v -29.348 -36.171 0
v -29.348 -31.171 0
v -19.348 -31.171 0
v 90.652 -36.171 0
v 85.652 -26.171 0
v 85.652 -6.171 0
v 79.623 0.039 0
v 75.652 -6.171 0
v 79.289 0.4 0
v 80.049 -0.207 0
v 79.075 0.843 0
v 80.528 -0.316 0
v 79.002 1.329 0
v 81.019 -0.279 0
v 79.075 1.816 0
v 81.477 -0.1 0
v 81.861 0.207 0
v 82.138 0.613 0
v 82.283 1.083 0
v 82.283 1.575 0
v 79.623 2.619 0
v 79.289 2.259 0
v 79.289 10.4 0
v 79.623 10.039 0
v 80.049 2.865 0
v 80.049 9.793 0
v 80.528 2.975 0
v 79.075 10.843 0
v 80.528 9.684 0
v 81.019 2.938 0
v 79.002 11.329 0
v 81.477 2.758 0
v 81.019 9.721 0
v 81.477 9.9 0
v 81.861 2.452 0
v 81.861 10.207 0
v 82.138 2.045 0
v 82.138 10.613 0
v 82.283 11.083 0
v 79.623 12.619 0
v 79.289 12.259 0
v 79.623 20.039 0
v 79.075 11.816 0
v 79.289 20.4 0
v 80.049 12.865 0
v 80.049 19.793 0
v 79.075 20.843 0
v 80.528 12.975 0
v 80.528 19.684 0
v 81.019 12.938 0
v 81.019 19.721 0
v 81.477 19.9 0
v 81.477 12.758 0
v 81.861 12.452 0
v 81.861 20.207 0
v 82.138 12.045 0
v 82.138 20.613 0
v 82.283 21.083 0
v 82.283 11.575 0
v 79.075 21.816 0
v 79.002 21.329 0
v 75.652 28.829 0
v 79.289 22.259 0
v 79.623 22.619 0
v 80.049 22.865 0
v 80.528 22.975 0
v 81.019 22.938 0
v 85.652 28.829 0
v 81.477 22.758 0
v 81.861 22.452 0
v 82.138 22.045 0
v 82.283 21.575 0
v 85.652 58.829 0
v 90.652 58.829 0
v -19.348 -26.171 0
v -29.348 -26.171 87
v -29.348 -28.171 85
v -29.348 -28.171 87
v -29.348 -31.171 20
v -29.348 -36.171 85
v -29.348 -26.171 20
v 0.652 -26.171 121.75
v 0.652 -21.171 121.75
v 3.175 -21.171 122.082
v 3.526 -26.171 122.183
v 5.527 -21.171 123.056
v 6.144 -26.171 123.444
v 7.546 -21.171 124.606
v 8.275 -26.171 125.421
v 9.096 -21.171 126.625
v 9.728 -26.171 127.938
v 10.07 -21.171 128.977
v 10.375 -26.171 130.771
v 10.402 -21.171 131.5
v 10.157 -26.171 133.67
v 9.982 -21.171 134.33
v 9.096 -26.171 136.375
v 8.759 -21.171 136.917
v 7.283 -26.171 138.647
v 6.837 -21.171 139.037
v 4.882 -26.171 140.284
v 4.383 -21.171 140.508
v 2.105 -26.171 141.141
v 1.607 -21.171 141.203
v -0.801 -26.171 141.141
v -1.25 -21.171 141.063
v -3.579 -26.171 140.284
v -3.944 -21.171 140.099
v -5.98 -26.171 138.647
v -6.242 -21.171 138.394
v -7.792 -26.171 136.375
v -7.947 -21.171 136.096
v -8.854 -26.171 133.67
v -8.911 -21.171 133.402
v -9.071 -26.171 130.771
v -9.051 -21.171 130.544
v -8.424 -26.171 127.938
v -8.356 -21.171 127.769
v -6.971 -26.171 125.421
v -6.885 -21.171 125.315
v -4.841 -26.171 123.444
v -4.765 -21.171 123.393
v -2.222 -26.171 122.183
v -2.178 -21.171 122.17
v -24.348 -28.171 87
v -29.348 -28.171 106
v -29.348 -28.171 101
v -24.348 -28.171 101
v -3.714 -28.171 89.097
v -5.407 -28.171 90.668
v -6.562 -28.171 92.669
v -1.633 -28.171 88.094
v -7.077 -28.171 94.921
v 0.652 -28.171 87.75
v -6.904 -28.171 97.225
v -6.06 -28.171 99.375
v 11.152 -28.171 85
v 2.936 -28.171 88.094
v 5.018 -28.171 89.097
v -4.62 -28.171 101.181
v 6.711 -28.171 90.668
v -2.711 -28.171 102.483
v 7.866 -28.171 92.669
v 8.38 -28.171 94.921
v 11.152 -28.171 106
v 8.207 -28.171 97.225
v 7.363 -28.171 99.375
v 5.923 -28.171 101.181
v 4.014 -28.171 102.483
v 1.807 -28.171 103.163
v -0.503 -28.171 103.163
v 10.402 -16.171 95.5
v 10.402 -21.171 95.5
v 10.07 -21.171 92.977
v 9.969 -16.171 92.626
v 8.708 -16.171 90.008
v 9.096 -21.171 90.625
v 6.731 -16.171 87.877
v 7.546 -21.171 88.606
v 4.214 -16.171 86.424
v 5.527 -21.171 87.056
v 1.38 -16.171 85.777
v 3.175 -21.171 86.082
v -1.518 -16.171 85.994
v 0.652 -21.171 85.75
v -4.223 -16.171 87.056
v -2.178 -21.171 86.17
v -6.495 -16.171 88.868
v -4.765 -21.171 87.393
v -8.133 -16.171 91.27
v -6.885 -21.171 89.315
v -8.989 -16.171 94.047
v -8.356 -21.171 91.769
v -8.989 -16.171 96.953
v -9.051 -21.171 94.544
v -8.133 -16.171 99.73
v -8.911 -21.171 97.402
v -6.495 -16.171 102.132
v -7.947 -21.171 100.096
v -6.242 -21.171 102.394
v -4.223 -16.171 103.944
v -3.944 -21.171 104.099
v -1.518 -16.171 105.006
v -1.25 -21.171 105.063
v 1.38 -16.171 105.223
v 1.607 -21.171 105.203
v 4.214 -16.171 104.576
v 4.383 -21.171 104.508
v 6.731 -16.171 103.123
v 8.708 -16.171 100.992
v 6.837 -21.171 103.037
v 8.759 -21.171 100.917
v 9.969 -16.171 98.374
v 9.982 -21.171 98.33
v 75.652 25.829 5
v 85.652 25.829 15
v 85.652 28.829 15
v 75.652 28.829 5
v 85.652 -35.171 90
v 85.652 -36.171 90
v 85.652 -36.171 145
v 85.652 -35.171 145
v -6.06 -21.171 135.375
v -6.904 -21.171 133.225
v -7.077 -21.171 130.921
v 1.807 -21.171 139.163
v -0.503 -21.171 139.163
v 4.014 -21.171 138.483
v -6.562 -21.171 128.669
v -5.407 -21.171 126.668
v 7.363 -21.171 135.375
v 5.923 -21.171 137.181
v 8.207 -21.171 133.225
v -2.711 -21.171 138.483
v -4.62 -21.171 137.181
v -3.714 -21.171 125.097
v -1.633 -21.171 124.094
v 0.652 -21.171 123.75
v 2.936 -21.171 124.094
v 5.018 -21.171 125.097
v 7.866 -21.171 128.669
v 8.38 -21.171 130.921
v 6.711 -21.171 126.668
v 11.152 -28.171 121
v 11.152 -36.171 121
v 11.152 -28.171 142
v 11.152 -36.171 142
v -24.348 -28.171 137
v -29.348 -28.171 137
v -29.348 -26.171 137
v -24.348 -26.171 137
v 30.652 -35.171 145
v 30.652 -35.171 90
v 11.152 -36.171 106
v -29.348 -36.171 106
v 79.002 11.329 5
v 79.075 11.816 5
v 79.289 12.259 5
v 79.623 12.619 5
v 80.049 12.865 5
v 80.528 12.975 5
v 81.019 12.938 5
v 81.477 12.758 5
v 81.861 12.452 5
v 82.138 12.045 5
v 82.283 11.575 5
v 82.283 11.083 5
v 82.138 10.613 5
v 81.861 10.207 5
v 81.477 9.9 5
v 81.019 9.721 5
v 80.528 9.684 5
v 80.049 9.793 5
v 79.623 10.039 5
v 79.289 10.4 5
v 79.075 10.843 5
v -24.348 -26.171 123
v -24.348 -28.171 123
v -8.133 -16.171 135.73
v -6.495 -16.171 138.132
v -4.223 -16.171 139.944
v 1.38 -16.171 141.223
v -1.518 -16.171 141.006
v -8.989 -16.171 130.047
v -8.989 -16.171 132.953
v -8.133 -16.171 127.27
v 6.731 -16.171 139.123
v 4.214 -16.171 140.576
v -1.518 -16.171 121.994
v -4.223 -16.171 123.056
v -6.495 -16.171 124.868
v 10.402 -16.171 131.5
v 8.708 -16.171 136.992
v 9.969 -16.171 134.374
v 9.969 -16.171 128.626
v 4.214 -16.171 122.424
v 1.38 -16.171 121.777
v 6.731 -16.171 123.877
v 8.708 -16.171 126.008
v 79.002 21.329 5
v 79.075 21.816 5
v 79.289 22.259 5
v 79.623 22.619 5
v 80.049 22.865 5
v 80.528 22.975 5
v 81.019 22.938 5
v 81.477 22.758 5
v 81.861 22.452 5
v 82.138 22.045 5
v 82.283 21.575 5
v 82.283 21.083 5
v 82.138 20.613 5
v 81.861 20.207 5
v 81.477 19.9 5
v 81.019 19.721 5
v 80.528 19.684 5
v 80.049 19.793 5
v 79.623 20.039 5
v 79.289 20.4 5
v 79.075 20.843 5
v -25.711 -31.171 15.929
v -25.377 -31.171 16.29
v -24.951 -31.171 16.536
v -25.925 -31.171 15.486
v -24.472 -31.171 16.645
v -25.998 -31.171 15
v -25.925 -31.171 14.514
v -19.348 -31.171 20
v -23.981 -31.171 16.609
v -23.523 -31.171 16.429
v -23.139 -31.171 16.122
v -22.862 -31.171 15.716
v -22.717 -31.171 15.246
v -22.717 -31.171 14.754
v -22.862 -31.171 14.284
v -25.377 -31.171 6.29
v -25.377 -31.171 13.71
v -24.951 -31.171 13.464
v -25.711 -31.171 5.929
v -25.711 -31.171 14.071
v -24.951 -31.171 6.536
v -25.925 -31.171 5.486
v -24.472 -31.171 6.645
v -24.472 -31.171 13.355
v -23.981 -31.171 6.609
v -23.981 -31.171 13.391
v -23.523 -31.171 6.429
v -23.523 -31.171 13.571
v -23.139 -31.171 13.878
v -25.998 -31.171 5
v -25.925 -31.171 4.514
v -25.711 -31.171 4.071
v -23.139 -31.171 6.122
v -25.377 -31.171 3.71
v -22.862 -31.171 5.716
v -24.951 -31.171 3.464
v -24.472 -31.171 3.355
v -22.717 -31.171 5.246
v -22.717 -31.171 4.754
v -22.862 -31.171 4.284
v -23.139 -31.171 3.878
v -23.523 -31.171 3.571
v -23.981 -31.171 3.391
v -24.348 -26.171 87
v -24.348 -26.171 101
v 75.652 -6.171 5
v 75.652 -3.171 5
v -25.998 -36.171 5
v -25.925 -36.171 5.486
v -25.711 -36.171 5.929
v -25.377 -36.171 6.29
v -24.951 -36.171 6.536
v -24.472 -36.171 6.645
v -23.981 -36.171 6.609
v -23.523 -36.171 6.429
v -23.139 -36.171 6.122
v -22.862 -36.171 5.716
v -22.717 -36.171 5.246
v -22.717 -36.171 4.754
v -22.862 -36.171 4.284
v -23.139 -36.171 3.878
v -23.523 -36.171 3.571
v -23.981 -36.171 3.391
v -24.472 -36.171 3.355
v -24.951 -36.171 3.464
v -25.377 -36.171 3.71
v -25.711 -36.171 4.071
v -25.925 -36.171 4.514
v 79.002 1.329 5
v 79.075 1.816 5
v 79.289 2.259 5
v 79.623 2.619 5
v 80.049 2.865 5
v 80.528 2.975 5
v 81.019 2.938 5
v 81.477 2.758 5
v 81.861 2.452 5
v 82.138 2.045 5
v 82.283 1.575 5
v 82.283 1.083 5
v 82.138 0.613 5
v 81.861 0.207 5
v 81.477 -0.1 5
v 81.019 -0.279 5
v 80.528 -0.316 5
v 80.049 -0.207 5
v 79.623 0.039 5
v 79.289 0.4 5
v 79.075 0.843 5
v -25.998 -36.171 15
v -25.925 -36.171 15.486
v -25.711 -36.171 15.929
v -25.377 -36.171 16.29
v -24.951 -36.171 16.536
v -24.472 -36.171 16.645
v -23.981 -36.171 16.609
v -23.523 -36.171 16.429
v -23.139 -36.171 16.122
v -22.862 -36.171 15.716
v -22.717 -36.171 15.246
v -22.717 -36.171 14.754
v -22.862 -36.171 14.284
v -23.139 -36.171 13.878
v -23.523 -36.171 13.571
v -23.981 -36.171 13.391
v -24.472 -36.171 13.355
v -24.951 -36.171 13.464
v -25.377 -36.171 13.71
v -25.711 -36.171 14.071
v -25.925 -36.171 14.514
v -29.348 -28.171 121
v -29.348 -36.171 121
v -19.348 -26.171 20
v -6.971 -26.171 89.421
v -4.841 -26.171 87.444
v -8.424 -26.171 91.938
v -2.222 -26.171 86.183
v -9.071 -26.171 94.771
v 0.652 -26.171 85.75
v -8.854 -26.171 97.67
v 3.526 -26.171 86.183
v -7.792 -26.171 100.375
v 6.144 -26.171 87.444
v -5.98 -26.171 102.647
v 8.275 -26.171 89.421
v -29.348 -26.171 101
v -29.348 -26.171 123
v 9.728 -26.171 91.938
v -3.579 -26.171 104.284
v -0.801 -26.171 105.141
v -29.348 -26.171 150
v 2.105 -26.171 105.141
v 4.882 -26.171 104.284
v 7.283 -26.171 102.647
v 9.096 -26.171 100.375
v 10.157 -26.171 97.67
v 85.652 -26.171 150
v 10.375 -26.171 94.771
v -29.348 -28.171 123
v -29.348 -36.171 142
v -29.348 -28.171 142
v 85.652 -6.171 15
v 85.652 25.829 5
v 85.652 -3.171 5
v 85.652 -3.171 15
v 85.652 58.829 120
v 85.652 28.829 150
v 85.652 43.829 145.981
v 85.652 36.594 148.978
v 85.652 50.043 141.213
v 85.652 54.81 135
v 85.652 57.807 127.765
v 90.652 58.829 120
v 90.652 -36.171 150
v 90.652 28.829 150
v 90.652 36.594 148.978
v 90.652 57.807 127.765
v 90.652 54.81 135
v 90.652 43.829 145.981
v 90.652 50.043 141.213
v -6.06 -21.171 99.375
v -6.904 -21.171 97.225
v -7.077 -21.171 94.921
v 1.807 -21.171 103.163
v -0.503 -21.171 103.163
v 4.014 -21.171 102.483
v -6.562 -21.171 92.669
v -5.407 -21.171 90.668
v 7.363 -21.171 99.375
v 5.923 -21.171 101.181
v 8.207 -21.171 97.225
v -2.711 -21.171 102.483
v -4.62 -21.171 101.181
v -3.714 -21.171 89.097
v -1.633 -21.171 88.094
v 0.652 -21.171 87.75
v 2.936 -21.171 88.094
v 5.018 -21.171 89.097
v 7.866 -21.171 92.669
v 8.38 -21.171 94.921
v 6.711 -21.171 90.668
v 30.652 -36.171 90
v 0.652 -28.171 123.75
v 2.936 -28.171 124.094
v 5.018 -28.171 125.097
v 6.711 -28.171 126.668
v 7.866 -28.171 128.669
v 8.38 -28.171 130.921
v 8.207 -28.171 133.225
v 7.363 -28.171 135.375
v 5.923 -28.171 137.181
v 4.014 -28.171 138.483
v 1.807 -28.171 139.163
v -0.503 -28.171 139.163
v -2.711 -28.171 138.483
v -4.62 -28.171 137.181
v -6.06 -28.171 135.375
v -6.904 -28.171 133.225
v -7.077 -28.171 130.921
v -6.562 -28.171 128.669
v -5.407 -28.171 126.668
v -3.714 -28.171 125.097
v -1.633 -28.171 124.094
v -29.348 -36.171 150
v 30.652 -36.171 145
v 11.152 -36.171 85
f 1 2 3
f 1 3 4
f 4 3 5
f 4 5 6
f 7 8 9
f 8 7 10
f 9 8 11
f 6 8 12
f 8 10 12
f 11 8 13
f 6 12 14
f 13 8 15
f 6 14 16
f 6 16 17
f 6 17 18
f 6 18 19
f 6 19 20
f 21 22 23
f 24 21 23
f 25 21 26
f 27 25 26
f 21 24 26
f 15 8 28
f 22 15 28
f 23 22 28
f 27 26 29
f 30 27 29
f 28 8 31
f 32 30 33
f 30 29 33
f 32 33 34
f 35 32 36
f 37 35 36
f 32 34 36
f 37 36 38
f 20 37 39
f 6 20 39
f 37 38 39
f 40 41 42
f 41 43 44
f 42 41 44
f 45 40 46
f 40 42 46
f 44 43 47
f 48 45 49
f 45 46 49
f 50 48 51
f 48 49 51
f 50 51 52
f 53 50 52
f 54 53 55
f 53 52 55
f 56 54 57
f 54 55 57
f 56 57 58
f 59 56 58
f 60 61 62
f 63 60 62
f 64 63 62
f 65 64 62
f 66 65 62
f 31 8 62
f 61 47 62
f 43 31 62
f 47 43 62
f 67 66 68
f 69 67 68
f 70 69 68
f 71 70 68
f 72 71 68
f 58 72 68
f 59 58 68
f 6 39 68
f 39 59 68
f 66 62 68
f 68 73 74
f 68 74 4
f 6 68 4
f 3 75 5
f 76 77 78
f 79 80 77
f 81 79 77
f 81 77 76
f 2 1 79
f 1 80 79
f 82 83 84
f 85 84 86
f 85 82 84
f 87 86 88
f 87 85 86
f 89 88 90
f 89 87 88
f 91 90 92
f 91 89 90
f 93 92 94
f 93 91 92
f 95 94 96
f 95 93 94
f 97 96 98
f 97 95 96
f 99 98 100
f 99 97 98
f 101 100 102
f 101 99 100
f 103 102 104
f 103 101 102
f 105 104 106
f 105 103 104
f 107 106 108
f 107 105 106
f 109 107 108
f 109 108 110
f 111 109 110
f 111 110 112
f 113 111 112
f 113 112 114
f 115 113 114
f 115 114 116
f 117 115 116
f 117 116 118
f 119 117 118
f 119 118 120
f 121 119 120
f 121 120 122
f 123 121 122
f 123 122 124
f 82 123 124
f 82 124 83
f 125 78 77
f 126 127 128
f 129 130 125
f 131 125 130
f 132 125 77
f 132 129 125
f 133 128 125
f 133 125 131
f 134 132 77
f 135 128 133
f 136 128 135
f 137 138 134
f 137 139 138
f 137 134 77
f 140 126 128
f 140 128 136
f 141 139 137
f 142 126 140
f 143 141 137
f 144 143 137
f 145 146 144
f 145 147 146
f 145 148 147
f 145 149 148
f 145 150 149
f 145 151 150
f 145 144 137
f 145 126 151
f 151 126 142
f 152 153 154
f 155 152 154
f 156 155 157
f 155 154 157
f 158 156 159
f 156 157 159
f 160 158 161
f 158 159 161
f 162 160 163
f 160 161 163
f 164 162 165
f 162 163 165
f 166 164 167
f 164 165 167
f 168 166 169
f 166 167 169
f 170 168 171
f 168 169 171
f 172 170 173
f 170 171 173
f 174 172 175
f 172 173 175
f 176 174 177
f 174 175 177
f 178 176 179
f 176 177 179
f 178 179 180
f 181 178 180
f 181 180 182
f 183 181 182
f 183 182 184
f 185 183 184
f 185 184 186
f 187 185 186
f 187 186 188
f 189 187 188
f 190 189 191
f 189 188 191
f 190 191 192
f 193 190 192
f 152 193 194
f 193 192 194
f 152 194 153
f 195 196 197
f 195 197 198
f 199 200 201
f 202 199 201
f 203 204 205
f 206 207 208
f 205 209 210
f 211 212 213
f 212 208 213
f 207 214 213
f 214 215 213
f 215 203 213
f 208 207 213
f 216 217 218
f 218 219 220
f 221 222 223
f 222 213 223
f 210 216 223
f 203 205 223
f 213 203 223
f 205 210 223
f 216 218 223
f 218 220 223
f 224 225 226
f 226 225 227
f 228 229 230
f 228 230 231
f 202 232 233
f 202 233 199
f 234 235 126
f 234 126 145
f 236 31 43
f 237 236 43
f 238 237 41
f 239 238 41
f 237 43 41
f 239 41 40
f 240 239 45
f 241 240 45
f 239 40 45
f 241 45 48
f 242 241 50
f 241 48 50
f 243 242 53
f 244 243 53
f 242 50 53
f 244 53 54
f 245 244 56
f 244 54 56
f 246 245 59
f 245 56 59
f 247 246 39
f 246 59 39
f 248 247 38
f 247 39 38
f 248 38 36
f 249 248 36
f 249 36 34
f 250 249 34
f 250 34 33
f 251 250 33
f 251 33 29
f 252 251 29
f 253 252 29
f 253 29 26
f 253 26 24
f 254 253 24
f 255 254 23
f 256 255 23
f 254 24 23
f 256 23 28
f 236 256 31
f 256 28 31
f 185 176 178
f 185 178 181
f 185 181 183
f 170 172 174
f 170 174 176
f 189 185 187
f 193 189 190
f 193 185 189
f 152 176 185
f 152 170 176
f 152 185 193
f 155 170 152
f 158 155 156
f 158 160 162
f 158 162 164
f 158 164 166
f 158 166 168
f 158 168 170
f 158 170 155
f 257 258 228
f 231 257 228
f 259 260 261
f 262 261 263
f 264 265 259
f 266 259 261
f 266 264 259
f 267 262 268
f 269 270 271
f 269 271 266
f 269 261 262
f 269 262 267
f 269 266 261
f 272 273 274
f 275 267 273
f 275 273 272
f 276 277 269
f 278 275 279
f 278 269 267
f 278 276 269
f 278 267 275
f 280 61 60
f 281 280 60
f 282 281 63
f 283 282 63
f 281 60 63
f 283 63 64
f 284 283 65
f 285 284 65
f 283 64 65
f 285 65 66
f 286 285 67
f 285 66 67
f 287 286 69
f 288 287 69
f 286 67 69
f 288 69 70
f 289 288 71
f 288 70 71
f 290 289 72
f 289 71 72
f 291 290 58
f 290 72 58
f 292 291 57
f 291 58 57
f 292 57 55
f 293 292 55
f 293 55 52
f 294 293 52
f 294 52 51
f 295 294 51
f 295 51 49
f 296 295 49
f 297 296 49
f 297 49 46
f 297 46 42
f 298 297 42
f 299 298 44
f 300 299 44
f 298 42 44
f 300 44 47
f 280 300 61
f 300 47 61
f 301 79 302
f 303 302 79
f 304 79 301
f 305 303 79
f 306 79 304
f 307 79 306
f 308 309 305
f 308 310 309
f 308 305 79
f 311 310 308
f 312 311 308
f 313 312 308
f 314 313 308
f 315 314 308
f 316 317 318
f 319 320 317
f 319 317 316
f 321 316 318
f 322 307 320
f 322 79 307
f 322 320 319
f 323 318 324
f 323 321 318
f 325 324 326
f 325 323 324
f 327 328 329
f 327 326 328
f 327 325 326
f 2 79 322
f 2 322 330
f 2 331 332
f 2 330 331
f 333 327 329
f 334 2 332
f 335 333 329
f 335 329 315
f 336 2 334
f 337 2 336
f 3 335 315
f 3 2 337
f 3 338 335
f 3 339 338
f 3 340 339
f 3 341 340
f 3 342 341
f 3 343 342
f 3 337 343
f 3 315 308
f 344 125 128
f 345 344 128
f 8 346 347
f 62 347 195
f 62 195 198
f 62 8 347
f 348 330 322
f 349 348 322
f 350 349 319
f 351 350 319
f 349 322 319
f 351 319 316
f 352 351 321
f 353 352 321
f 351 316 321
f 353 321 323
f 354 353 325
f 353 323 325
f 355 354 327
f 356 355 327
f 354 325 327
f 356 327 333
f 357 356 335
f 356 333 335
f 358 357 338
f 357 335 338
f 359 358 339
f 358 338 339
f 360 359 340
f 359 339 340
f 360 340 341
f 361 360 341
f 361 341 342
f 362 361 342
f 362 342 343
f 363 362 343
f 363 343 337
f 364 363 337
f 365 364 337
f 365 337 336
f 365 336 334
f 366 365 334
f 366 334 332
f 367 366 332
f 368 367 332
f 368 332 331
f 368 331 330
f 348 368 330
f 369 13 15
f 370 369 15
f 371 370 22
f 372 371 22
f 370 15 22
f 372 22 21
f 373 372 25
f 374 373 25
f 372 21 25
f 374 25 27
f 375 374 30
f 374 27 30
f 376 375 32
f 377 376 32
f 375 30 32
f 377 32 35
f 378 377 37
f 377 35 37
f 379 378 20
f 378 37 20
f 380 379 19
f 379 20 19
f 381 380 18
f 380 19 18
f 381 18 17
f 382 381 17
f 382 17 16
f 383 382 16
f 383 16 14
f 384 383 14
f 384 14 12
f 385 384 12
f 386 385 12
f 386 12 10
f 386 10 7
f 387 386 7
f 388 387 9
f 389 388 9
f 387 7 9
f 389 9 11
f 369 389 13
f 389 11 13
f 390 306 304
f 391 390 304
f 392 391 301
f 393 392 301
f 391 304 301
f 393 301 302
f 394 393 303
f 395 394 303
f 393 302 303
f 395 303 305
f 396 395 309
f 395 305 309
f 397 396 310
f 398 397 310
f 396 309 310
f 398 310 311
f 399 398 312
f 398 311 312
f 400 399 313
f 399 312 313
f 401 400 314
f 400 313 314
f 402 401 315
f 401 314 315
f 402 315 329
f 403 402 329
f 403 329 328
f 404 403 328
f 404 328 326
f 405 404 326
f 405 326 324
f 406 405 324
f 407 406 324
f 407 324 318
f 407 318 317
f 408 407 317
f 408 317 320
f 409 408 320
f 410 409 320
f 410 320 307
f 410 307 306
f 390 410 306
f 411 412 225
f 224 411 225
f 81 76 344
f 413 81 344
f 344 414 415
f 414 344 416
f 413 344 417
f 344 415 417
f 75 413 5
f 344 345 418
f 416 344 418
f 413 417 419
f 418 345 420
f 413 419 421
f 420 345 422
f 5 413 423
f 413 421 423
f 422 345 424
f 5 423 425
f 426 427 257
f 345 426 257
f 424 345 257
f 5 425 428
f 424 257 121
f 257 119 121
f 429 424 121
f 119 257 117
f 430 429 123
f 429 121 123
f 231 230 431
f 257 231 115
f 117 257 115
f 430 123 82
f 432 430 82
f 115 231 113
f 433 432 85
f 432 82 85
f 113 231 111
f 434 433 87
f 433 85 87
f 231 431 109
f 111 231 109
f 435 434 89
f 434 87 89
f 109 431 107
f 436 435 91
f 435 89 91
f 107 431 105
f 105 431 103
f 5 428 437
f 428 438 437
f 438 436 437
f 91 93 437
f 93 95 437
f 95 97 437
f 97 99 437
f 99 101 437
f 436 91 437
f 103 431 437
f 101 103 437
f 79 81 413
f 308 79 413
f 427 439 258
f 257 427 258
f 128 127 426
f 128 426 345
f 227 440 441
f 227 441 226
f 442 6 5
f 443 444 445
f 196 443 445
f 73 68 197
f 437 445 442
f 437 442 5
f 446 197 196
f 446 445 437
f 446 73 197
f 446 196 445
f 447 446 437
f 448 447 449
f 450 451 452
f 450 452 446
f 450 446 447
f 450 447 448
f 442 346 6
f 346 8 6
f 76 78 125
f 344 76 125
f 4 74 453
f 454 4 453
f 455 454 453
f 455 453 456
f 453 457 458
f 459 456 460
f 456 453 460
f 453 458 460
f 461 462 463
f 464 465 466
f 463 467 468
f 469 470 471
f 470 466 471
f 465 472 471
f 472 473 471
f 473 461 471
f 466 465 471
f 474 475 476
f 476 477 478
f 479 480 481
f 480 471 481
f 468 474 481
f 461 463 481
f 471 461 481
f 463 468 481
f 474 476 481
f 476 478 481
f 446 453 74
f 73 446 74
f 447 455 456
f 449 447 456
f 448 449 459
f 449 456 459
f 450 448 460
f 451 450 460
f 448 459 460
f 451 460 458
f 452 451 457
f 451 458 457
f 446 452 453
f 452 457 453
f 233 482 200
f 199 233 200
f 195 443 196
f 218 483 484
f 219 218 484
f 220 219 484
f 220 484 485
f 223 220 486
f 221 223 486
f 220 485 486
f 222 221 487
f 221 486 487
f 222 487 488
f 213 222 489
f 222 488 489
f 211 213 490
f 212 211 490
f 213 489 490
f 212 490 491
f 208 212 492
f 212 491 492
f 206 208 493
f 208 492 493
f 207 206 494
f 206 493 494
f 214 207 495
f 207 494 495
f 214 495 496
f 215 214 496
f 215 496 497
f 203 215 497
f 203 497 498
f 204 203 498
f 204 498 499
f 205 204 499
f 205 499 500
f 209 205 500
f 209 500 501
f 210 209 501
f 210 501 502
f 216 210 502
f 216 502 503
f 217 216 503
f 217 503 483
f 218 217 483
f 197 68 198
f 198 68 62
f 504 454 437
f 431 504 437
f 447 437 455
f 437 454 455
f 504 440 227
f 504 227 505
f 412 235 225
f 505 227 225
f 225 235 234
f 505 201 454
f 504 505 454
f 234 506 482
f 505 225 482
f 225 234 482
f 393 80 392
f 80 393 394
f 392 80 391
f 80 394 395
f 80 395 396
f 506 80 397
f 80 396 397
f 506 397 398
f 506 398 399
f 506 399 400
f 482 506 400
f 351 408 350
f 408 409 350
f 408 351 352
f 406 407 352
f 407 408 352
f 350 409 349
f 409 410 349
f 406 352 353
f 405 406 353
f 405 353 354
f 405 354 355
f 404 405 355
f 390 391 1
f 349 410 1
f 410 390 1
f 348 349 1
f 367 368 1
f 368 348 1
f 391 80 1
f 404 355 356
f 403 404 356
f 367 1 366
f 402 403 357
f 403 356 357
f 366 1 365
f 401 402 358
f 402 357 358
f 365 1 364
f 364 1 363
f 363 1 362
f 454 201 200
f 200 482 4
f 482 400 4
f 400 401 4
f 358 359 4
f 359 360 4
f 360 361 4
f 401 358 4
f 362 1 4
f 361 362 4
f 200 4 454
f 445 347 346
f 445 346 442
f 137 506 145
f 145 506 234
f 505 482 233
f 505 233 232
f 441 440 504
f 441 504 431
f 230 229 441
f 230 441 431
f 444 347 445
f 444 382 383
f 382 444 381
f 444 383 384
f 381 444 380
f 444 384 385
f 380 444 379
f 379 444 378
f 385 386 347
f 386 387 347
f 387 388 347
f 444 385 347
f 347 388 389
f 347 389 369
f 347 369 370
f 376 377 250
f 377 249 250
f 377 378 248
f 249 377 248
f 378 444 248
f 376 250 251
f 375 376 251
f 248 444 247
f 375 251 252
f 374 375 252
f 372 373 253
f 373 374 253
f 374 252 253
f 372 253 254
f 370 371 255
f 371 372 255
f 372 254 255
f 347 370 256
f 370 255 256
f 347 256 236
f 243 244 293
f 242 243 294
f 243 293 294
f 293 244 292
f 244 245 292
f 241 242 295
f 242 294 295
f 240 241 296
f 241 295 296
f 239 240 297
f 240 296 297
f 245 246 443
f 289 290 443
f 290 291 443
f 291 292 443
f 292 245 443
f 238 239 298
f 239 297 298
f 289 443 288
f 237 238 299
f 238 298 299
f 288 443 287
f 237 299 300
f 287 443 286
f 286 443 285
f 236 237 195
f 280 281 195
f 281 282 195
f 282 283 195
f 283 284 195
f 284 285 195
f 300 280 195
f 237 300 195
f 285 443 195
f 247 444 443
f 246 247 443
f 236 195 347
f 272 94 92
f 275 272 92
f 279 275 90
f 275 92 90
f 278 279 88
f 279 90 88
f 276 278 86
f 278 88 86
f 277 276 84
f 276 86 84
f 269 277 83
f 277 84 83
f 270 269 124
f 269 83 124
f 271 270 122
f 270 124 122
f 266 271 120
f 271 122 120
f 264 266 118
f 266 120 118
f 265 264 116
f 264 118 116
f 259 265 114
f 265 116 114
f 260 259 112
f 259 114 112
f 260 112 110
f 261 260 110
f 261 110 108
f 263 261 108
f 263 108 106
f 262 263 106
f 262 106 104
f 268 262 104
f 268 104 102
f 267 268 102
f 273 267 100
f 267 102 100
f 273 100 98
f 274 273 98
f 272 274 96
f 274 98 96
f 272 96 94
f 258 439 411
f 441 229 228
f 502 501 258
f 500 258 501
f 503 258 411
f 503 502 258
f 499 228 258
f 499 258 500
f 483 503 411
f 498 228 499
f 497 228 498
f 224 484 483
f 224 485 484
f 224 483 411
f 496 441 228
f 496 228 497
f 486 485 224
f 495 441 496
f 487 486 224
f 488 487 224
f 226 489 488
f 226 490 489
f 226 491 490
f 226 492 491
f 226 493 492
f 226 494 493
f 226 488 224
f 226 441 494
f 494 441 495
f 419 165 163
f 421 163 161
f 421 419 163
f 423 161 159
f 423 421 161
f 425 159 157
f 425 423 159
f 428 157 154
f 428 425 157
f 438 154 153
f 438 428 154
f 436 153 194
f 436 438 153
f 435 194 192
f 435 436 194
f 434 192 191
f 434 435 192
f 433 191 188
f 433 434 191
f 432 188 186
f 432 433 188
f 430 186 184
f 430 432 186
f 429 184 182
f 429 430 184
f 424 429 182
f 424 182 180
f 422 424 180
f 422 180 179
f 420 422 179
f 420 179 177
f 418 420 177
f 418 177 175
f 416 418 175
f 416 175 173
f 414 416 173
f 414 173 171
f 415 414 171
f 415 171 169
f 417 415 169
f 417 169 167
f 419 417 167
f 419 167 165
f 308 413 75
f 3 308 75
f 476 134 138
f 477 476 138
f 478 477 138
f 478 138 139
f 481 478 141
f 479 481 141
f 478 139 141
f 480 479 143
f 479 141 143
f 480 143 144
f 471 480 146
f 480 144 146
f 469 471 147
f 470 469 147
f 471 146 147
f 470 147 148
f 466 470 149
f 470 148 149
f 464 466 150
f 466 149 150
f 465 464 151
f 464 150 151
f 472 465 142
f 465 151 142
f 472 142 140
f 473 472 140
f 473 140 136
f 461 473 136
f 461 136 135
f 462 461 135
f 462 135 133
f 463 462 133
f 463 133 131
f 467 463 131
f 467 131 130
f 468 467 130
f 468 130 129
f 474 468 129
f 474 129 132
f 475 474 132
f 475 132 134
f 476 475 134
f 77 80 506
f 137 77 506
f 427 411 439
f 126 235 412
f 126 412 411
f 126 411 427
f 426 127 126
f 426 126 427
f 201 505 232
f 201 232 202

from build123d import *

# Parameters (mm, degrees)
SKETCH_1_W           = 120
SKETCH_1_H           = 95
EXTRUDE_1_DEPTH      = 150
SKETCH_2_W           = 115
SKETCH_2_H           = 85
CUT_EXTRUDE_1_DEPTH  = 150
CUT_EXTRUDE_2_DEPTH  = 150
SKETCH_5_W           = 10
SKETCH_5_H           = 35
SKETCH_5_R           = 1.65
EXTRUDE_2_DEPTH      = 5
EXTRUDE_START        = -33
EXTRUDE_3_DEPTH      = 3
EXTRUDE_START_2      = 52
EXTRUDE_4_DEPTH      = 3
SKETCH_8_W           = 10
SKETCH_8_H           = 20
SKETCH_8_R           = 1.65
CUT_EXTRUDE_3_DEPTH  = 5
SKETCH_10_R          = 1.65
CUT_EXTRUDE_4_DEPTH  = 195.788985905
SKETCH_22_R          = 7.75
CUT_EXTRUDE_8_DEPTH  = 199.407311022
SKETCH_24_R          = 9.75
SKETCH_24_R_2        = 7.75
EXTRUDE_7_DEPTH      = 15
SKETCH_26_R          = 9.75
EXTRUDE_8_DEPTH      = 5
SKETCH_31_W          = 40.5
SKETCH_31_H          = 21
CUT_EXTRUDE_11_DEPTH = 8
SKETCH_32_W          = 5
SKETCH_32_H          = 14
CUT_EXTRUDE_12_DEPTH = 200.355835204
SKETCH_33_W          = 55
SKETCH_33_H          = 55
CUT_EXTRUDE_13_DEPTH = 1
EXTRUDE_9_DEPTH      = 5


with BuildPart() as part:
    # 草图1 → 凸台-拉伸1 (new body)
    with BuildSketch(Plane.XY):
        with Locations((30.651801029, 11.329331046)):
            Rectangle(SKETCH_1_W, SKETCH_1_H)
    extrude(amount=EXTRUDE_1_DEPTH)

    # 草图2 → 切除-拉伸1 (cut)
    with BuildSketch(Plane.XY.offset(150)):
        with Locations((28.151801029, 16.329331046)):
            Rectangle(SKETCH_2_W, SKETCH_2_H)
    extrude(amount=-CUT_EXTRUDE_1_DEPTH, mode=Mode.SUBTRACT)

    # 草图3 → 切除-拉伸2 (cut)
    with BuildSketch(Plane(origin=(90.651801029, 0, 0), x_dir=(0, 0, -1), z_dir=(1, 0, 0))):
        Polygon((-150, 58.829331046), (-150, -26.170668954), (0, 58.829331046), align=None)
    extrude(amount=-CUT_EXTRUDE_2_DEPTH, mode=Mode.SUBTRACT)

    # 草图5 → 凸台-拉伸2 (add)
    with BuildSketch(Plane(origin=(0, 0, 0), x_dir=(-1, 0, 0), z_dir=(0, 0, -1))):
        with Locations((-80.651801029, 11.329331046)):
            Rectangle(SKETCH_5_W, SKETCH_5_H)
        with Locations((-80.651801029, 21.329331046)):
            Circle(SKETCH_5_R, mode=Mode.SUBTRACT)
        with Locations((-80.651801337, 11.329331046)):
            Circle(SKETCH_5_R, mode=Mode.SUBTRACT)
        with Locations((-80.651801337, 1.329331046)):
            Circle(SKETCH_5_R, mode=Mode.SUBTRACT)
    extrude(amount=-EXTRUDE_2_DEPTH)

    # 草图6 → 凸台-拉伸3 (add)
    with BuildSketch(Plane(origin=(0, -36.170668954, 0), x_dir=(-1, 0, 0), z_dir=(0, -1, 0)).offset(EXTRUDE_START)):
        Polygon((-85.651801029, -5), (-75.651801029, -5), (-85.651801029, -15), align=None)
    extrude(amount=EXTRUDE_3_DEPTH)

    # 草图7 → 凸台-拉伸4 (add)
    with BuildSketch(Plane(origin=(0, -26.170668954, 0), x_dir=(1, 0, 0), z_dir=(0, 1, 0)).offset(EXTRUDE_START_2)):
        Polygon((75.651801029, -5), (85.651801029, -5), (85.651801029, -15), align=None)
    extrude(amount=EXTRUDE_4_DEPTH)

    # 草图8 → 切除-拉伸3 (cut)
    with BuildSketch(Plane(origin=(0, -26.170668954, 0), x_dir=(1, 0, 0), z_dir=(0, 1, 0))):
        with Locations((-24.348198971, -10)):
            Rectangle(SKETCH_8_W, SKETCH_8_H)
        with Locations(Location((-24.348198971, -5, 0), (0, 0, 180))):
            Circle(SKETCH_8_R, mode=Mode.SUBTRACT)
        with Locations(Location((-24.348198971, -15, 0), (0, 0, 180))):
            Circle(SKETCH_8_R, mode=Mode.SUBTRACT)
    extrude(amount=-CUT_EXTRUDE_3_DEPTH, mode=Mode.SUBTRACT)

    # 草图10 → 切除-拉伸4 (cut, through all)
    with BuildSketch(Plane(origin=(0, -26.170668954, 0), x_dir=(1, 0, 0), z_dir=(0, 1, 0))):
        with Locations(Location((-24.348198971, -5, 0), (0, 0, 180))):
            Circle(SKETCH_10_R)
        with Locations(Location((-24.348198971, -15, 0), (0, 0, 180))):
            Circle(SKETCH_10_R)
    extrude(amount=-CUT_EXTRUDE_4_DEPTH, mode=Mode.SUBTRACT)

    # 草图22 → 切除-拉伸8 (cut, through all)
    with BuildSketch(Plane(origin=(76.451044211, -36.170668954, 11.627382734), x_dir=(-1, 0, 0), z_dir=(0, -1, 0))):
        with Locations(Location((75.799243182, -83.872617266, 0), (0, 0, 90))):
            Circle(SKETCH_22_R)
        with Locations(Location((75.799243182, -119.872617266, 0), (0, 0, 90))):
            Circle(SKETCH_22_R)
    extrude(amount=-CUT_EXTRUDE_8_DEPTH, mode=Mode.SUBTRACT)

    # 草图24 → 凸台-拉伸7 (add)
    # profile 1 of 2: a face of its own
    with BuildSketch(Plane(origin=(76.451044211, -36.170668954, 11.627382734), x_dir=(-1, 0, 0), z_dir=(0, -1, 0))):
        with Locations(Location((75.799243182, -83.872617266, 0), (0, 0, 90))):
            Circle(SKETCH_24_R)
        with Locations(Location((75.799243182, -83.872617266, 0), (0, 0, 90))):
            Circle(SKETCH_24_R_2, mode=Mode.SUBTRACT)
    # profile 2 of 2: a face of its own
    with BuildSketch(Plane(origin=(76.451044211, -36.170668954, 11.627382734), x_dir=(-1, 0, 0), z_dir=(0, -1, 0))):
        with Locations(Location((75.799243182, -119.872617266, 0), (0, 0, 90))):
            Circle(SKETCH_24_R)
        with Locations(Location((75.799243182, -119.872617266, 0), (0, 0, 90))):
            Circle(SKETCH_24_R_2, mode=Mode.SUBTRACT)
    extrude(amount=-EXTRUDE_7_DEPTH)

    # 草图26 → 凸台-拉伸8 (add)
    with BuildSketch(Plane(origin=(-76.451044211, -21.170668954, 11.627382734), x_dir=(1, 0, 0), z_dir=(0, 1, 0))):
        with Locations((77.10284524, -83.872617266)):
            Circle(SKETCH_26_R)
        with Locations((77.10284524, -119.872617266)):
            Circle(SKETCH_26_R)
    extrude(amount=EXTRUDE_8_DEPTH)

    # 草图31 → 切除-拉伸11 (cut)
    with BuildSketch(Plane.XZ.offset(36.170668954)):
        with Locations((-9.098198971, 131.5)):
            Rectangle(SKETCH_31_W, SKETCH_31_H)
        with Locations((-9.098198971, 95.5)):
            Rectangle(SKETCH_31_W, SKETCH_31_H)
    extrude(amount=-CUT_EXTRUDE_11_DEPTH, mode=Mode.SUBTRACT)

    # 草图32 → 切除-拉伸12 (cut, through all)
    with BuildSketch(Plane.XZ.offset(36.170668954)):
        with Locations((-26.848198971, 130)):
            Rectangle(SKETCH_32_W, SKETCH_32_H)
        with Locations((-26.848198971, 94)):
            Rectangle(SKETCH_32_W, SKETCH_32_H)
    extrude(amount=-CUT_EXTRUDE_12_DEPTH, mode=Mode.SUBTRACT)

    # 草图33 → 切除-拉伸13 (cut)
    with BuildSketch(Plane.XZ.offset(36.170668954)):
        with Locations((58.151801029, 117.5)):
            Rectangle(SKETCH_33_W, SKETCH_33_H)
    extrude(amount=-CUT_EXTRUDE_13_DEPTH, mode=Mode.SUBTRACT)

    # 草图34 → 凸台-拉伸9 (add)
    with BuildSketch(Plane(origin=(90.651801029, 0, 0), x_dir=(0, 0, -1), z_dir=(1, 0, 0))):
        with BuildLine():
            Line((-150, -26.170668954), (-150, 28.829331046))
            ThreePointArc((-150, 28.829331046), (-141.213203436, 50.042534482), (-120, 58.829331046))
            Line((-120, 58.829331046), (0, 58.829331046))
            Line((0, 58.829331046), (-150, -26.170668954))
        make_face()
    extrude(amount=-EXTRUDE_9_DEPTH)


solid = part.part
